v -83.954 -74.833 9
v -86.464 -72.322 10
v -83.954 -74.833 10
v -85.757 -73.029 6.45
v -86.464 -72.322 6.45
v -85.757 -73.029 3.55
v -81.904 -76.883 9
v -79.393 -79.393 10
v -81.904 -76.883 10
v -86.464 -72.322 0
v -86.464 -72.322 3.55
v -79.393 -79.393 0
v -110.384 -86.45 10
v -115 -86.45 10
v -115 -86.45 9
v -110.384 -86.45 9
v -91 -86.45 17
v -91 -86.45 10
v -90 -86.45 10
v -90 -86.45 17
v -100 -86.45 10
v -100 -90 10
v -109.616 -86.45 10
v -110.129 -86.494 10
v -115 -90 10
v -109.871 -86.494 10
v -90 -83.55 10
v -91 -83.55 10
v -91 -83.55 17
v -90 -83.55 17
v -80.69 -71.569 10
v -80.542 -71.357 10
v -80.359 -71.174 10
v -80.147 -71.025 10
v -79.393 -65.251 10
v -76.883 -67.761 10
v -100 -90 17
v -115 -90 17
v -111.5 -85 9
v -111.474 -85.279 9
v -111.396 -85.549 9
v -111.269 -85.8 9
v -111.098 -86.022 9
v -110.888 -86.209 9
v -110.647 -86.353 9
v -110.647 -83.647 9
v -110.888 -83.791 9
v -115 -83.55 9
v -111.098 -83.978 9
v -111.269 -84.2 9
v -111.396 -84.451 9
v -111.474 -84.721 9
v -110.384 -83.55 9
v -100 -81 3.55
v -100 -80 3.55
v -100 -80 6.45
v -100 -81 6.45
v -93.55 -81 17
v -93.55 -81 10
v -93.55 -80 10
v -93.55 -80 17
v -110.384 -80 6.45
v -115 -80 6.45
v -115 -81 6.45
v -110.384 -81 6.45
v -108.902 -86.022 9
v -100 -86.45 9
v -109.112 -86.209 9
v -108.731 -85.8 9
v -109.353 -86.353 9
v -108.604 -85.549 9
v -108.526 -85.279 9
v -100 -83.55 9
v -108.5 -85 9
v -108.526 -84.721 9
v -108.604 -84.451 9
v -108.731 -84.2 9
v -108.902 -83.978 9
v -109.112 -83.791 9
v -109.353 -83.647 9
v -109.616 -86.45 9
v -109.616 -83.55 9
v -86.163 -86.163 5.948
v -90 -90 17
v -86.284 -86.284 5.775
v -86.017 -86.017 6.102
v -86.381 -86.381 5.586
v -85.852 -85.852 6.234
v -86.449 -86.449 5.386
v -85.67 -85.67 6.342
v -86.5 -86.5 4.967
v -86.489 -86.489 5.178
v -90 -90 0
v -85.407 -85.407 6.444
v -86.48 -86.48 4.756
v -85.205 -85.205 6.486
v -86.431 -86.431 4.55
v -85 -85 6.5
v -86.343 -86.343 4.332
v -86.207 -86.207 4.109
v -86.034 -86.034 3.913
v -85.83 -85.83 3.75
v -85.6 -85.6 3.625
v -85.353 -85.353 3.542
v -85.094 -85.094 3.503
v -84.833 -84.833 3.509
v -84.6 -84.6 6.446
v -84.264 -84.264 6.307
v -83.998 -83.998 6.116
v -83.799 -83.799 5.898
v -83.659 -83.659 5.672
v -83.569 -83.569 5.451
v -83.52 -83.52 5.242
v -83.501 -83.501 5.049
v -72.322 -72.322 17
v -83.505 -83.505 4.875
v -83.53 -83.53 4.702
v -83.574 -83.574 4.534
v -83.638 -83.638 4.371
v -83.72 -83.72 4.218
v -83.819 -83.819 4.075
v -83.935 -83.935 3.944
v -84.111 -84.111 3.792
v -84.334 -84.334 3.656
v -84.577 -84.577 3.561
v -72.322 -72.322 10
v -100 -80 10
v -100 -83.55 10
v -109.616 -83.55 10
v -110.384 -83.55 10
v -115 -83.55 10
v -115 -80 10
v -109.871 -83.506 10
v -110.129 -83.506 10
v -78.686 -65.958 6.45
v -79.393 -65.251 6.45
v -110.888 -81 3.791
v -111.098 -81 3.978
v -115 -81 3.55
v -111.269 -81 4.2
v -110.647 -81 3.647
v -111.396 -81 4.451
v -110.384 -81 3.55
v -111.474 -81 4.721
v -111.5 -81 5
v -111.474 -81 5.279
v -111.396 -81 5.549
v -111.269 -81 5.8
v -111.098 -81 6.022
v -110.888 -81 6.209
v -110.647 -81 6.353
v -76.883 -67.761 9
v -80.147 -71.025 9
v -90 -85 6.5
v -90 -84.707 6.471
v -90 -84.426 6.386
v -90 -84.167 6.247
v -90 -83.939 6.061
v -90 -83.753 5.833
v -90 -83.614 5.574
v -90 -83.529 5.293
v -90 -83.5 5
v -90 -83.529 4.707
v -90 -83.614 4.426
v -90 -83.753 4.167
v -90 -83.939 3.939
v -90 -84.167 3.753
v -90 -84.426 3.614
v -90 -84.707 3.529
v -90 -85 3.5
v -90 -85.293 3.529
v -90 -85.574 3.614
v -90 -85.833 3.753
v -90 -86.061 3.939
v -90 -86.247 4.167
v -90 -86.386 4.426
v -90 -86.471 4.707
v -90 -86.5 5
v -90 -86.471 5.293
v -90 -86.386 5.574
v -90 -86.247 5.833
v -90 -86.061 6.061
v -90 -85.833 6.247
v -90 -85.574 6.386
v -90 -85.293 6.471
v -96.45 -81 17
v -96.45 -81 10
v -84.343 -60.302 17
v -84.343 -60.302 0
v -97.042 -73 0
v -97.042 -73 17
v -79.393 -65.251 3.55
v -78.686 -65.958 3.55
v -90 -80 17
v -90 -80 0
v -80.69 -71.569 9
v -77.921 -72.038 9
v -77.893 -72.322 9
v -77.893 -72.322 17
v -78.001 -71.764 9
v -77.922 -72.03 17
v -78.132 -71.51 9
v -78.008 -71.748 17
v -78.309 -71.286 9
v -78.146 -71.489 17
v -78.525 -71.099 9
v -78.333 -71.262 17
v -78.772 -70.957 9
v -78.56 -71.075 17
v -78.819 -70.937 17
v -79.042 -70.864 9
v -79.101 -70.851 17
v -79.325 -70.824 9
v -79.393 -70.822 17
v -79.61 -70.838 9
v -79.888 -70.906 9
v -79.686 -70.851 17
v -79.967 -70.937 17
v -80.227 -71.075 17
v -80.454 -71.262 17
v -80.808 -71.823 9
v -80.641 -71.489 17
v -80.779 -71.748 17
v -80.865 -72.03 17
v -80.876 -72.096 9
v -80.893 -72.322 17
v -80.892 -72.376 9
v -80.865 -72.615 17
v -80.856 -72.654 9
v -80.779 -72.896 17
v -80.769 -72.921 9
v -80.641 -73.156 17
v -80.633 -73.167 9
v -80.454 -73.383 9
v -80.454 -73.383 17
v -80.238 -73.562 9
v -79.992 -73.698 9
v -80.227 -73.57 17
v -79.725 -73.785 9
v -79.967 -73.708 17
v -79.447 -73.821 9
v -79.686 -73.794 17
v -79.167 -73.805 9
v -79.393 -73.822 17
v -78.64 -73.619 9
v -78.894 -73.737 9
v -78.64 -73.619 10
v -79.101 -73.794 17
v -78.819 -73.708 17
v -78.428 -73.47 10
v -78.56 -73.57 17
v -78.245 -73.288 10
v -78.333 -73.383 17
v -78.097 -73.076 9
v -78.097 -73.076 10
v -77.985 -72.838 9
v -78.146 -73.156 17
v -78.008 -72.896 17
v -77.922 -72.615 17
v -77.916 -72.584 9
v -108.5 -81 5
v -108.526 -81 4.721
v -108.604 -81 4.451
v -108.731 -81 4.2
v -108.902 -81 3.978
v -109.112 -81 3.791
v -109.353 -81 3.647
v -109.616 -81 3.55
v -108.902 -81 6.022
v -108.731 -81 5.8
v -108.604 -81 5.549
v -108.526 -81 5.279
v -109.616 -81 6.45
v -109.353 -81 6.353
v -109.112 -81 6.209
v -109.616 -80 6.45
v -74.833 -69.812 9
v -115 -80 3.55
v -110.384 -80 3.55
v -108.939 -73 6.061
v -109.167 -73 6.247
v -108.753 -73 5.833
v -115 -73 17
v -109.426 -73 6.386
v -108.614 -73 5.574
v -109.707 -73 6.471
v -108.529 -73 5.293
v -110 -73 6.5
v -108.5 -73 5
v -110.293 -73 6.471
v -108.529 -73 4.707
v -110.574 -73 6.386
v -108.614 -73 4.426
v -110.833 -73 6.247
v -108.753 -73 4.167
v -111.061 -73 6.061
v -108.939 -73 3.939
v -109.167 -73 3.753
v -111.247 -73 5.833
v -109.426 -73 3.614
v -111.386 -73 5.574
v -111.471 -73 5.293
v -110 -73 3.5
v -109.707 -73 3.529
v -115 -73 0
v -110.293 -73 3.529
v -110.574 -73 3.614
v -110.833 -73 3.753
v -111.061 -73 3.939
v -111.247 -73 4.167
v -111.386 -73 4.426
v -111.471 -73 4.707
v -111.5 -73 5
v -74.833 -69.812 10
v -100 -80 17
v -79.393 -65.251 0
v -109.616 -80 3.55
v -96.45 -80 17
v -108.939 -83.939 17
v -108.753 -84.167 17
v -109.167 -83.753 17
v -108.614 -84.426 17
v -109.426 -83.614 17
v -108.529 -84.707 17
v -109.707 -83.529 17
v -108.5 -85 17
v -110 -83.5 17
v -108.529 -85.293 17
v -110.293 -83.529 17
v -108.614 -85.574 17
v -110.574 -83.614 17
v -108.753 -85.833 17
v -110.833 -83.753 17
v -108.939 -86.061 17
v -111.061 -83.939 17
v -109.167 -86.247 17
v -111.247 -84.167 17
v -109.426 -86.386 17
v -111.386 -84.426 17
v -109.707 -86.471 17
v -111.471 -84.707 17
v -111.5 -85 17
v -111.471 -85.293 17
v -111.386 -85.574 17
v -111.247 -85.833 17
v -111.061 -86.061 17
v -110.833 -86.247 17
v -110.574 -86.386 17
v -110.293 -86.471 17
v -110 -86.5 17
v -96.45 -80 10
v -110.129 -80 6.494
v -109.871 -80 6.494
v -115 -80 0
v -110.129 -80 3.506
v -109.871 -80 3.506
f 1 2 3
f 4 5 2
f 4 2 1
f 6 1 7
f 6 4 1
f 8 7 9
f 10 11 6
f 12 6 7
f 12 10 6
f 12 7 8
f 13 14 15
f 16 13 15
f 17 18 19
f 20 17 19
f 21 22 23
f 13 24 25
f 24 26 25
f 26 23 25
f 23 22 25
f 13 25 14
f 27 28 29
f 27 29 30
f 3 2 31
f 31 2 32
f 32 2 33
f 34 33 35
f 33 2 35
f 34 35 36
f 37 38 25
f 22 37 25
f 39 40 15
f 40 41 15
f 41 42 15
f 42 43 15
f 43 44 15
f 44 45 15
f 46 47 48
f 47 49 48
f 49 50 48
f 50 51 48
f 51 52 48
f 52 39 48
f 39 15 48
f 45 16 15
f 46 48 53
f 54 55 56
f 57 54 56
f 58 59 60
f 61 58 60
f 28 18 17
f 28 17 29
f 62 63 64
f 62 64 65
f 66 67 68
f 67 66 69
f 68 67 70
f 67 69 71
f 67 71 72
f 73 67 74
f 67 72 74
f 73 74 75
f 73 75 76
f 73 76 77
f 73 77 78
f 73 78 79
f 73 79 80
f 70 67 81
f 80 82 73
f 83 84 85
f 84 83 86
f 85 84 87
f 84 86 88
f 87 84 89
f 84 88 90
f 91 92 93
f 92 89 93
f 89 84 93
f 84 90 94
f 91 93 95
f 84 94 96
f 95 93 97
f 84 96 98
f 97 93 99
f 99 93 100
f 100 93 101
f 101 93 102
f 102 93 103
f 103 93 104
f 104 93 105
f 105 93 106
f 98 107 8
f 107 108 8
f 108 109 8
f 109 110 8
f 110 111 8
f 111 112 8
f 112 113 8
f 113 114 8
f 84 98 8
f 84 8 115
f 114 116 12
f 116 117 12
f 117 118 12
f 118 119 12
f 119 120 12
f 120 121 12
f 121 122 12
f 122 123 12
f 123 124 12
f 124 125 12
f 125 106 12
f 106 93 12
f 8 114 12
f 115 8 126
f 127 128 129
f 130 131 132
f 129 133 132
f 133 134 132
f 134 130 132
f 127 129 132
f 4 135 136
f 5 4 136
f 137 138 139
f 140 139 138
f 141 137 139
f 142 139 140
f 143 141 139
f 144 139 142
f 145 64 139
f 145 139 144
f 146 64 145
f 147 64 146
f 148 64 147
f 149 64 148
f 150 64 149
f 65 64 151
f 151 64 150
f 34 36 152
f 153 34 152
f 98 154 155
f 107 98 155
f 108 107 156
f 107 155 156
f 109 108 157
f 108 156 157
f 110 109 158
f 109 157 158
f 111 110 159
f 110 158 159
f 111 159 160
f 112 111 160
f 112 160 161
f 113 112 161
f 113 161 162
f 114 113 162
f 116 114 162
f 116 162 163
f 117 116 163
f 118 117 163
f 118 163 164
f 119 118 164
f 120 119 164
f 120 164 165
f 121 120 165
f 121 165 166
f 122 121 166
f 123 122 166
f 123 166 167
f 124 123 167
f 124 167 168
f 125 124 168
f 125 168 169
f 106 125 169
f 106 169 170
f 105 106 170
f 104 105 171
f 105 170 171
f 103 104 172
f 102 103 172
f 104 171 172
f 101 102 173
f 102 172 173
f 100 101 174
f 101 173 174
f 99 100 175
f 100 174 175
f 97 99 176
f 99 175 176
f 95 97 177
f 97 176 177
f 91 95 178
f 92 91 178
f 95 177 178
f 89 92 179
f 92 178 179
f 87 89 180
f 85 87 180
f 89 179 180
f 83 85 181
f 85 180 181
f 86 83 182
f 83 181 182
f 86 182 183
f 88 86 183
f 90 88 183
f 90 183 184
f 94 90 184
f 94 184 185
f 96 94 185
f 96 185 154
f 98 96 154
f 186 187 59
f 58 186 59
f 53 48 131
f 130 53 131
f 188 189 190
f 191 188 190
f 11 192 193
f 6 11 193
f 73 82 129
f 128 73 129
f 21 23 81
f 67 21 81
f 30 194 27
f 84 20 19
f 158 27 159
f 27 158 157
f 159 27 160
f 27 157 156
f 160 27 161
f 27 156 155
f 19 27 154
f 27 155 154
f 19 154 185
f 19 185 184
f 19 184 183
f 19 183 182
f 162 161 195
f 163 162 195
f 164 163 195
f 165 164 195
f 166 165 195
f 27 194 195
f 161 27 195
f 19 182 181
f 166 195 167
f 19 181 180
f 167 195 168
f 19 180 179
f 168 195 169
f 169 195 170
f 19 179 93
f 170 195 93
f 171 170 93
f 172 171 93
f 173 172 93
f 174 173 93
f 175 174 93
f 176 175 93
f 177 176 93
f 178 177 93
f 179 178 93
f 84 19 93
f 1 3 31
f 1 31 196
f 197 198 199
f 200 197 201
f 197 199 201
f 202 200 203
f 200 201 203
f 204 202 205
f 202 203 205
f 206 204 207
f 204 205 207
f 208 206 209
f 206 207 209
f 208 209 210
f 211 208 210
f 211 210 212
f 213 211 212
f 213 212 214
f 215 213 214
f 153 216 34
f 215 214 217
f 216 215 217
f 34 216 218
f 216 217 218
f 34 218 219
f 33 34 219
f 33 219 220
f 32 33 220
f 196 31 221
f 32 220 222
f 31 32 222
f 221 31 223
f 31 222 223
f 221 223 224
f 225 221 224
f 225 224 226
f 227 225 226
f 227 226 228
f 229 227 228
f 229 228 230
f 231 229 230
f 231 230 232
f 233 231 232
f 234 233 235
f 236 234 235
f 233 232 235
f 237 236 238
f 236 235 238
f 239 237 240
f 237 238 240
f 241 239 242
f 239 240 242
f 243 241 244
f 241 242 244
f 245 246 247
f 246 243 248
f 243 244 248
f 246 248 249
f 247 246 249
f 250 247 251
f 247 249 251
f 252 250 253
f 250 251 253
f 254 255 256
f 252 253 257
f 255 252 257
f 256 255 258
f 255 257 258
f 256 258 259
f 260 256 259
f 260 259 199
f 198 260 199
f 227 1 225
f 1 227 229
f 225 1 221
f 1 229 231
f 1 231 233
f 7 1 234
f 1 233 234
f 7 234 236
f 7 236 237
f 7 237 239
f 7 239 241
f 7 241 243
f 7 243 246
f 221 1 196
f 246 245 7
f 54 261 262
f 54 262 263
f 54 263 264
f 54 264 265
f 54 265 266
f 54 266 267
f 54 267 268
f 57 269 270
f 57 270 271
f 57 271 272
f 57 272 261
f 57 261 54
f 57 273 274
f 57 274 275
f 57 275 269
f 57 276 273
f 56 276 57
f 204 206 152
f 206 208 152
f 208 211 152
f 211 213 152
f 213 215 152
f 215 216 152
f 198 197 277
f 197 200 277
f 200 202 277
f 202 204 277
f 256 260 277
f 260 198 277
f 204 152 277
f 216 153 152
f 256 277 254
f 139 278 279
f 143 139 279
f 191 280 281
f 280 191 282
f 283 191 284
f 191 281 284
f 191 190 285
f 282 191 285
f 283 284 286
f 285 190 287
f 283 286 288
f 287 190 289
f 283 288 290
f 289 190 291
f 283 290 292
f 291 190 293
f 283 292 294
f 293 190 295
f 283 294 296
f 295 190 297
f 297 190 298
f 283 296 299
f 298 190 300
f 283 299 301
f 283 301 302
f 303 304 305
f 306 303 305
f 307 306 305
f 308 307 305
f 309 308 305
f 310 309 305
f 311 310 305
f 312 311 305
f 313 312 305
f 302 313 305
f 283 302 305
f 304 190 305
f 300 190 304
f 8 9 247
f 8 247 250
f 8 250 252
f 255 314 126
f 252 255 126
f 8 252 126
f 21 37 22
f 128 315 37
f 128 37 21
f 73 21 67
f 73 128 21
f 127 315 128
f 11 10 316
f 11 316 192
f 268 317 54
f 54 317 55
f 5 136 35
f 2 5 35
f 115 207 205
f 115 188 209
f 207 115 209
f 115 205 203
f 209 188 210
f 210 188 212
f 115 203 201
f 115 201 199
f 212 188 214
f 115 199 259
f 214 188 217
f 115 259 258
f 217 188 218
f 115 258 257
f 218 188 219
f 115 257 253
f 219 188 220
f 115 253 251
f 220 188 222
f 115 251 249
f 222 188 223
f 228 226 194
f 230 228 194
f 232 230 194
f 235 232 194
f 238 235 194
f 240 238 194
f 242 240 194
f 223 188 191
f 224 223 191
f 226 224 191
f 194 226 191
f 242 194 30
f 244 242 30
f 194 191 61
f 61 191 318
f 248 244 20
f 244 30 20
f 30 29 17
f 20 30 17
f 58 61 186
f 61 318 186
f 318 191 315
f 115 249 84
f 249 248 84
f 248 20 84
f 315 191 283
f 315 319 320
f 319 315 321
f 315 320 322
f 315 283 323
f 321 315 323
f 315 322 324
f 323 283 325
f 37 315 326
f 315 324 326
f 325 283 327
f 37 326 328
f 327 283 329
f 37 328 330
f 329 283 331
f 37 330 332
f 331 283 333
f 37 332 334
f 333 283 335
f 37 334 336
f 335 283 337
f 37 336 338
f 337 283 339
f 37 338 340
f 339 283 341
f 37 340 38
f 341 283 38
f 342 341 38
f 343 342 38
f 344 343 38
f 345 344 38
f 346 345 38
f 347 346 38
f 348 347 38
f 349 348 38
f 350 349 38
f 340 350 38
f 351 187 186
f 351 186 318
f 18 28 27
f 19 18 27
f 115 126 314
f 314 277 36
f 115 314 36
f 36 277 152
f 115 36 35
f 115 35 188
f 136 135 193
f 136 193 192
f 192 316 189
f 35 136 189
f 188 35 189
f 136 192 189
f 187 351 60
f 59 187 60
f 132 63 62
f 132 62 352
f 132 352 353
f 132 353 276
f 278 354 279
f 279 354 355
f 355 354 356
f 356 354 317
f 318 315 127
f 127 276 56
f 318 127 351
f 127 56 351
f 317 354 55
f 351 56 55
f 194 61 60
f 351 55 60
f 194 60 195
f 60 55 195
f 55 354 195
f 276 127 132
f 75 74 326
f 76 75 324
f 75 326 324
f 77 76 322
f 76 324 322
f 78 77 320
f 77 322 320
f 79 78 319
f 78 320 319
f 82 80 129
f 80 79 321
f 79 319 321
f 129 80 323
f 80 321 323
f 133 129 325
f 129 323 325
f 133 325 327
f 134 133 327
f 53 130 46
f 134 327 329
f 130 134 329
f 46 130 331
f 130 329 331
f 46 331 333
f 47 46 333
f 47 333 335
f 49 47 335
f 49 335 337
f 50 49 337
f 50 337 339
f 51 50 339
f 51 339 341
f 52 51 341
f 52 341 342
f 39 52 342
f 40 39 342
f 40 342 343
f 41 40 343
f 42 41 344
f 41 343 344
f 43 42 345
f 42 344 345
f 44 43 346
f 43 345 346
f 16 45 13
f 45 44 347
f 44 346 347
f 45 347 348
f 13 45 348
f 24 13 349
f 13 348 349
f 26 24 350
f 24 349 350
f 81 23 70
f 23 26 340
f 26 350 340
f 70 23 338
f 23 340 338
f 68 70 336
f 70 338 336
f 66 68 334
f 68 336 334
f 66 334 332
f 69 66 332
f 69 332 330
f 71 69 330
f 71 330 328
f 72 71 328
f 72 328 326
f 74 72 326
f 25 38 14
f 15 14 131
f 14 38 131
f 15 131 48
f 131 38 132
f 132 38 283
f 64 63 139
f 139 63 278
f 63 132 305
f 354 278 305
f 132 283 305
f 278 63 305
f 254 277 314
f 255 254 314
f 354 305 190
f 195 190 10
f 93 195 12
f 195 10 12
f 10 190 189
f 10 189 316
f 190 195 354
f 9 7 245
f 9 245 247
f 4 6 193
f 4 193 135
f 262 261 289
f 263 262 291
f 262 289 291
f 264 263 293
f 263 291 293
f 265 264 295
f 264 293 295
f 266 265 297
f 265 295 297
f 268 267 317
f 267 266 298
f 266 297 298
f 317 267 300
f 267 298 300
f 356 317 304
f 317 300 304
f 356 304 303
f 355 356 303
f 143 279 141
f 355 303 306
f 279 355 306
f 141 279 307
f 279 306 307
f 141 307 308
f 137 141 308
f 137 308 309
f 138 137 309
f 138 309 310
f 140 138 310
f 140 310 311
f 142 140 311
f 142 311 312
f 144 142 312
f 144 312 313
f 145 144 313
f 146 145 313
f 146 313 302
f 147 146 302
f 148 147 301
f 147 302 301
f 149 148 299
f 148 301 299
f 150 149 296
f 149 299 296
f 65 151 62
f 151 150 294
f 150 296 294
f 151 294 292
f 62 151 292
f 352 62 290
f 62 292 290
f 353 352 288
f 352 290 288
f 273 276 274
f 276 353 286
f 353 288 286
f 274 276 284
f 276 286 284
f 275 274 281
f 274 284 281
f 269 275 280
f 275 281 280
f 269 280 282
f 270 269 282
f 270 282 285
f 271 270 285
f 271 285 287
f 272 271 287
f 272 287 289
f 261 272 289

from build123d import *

# Parameters (mm, degrees)
MAIN_DEPTH          = 17
CUT_EXTRUDE1_DEPTH  = 10
SKETCH3_R           = 1.5
CUT_EXTRUDE2_DEPTH  = 18
SKETCH4_W           = 2.9
SKETCH4_H           = 1
SKETCH4_W_2         = 1
SKETCH4_H_2         = 2.9
BOSS_EXTRUDE1_DEPTH = 7
SKETCH5_W           = 15
SKETCH5_H           = 2.9
BOSS_EXTRUDE2_DEPTH = 1
SKETCH6_R           = 1.5
CUT_EXTRUDE3_DEPTH  = 18
BOSS_EXTRUDE3_DEPTH = 15
SKETCH8_R           = 1.5
CUT_EXTRUDE4_DEPTH  = 18
SKETCH9_R           = 1.5
CUT_EXTRUDE5_DEPTH  = 18.67766953


with BuildPart() as part:
    # Sketch1 → Main (new body)
    with BuildSketch(Plane.XY):
        Polygon((-90, -90), (-72.32233047, -72.32233047), (-84.343145751, -60.30151519), (-97.04163056, -73), (-115, -73), (-115, -80), (-90, -80), align=None)
    extrude(amount=MAIN_DEPTH)

    # Sketch2 → Cut-Extrude1 (cut)
    with BuildSketch(Plane(origin=(-72.32233047, -72.32233047, 0), x_dir=(0.707106781, -0.707106781, 0), z_dir=(0.707106781, 0.707106781, 0))):
        Polygon((-3.55, -10), (0, -10), (0, 0), (-10, 0), (-10, -3.55), (-9, -3.55), (-9, -6.45), (-10, -6.45), (-10, -10), (-6.45, -10), (-6.45, -9), (-3.55, -9), align=None)
    extrude(amount=-CUT_EXTRUDE1_DEPTH, mode=Mode.SUBTRACT)

    # Sketch3 → Cut-Extrude2 (cut, through all)
    with BuildSketch(Plane.XY.offset(17)):
        with Locations((-79.393398282, -72.32233047)):
            Circle(SKETCH3_R)
    extrude(amount=-CUT_EXTRUDE2_DEPTH, mode=Mode.SUBTRACT)

    # Sketch4 → Boss-Extrude1 (add)
    with BuildSketch(Plane.XY.offset(10)):
        with Locations((-95, -80.5)):
            Rectangle(SKETCH4_W, SKETCH4_H)
        with Locations((-90.5, -85)):
            Rectangle(SKETCH4_W_2, SKETCH4_H_2)
    extrude(amount=BOSS_EXTRUDE1_DEPTH)

    # Sketch5 → Boss-Extrude2 (add)
    with BuildSketch(Plane.XZ.offset(80)):
        with Locations((-107.5, 5)):
            Rectangle(SKETCH5_W, SKETCH5_H)
    extrude(amount=BOSS_EXTRUDE2_DEPTH)

    # Sketch6 → Cut-Extrude3 (cut, through all)
    with BuildSketch(Plane(origin=(0, -73, 0), x_dir=(1, 0, 0), z_dir=(0, 1, 0))):
        with Locations((-110, -5)):
            Circle(SKETCH6_R)
    extrude(amount=-CUT_EXTRUDE3_DEPTH, mode=Mode.SUBTRACT)

    # Sketch7 → Boss-Extrude3 (add)
    with BuildSketch(Plane.ZY.offset(115)):
        Polygon((17, -80), (17, -90), (10, -90), (10, -86.45), (9, -86.45), (9, -83.55), (10, -83.55), (10, -80), align=None)
    extrude(amount=-BOSS_EXTRUDE3_DEPTH)

    # Sketch8 → Cut-Extrude4 (cut, through all)
    with BuildSketch(Plane.XY.offset(17)):
        with Locations((-110, -85)):
            Circle(SKETCH8_R)
    extrude(amount=-CUT_EXTRUDE4_DEPTH, mode=Mode.SUBTRACT)

    # Sketch9 → Cut-Extrude5 (cut, through all)
    with BuildSketch(Plane.ZY.offset(90)):
        with Locations((5, -85)):
            Circle(SKETCH9_R)
    extrude(amount=-CUT_EXTRUDE5_DEPTH, mode=Mode.SUBTRACT)


solid = part.part
